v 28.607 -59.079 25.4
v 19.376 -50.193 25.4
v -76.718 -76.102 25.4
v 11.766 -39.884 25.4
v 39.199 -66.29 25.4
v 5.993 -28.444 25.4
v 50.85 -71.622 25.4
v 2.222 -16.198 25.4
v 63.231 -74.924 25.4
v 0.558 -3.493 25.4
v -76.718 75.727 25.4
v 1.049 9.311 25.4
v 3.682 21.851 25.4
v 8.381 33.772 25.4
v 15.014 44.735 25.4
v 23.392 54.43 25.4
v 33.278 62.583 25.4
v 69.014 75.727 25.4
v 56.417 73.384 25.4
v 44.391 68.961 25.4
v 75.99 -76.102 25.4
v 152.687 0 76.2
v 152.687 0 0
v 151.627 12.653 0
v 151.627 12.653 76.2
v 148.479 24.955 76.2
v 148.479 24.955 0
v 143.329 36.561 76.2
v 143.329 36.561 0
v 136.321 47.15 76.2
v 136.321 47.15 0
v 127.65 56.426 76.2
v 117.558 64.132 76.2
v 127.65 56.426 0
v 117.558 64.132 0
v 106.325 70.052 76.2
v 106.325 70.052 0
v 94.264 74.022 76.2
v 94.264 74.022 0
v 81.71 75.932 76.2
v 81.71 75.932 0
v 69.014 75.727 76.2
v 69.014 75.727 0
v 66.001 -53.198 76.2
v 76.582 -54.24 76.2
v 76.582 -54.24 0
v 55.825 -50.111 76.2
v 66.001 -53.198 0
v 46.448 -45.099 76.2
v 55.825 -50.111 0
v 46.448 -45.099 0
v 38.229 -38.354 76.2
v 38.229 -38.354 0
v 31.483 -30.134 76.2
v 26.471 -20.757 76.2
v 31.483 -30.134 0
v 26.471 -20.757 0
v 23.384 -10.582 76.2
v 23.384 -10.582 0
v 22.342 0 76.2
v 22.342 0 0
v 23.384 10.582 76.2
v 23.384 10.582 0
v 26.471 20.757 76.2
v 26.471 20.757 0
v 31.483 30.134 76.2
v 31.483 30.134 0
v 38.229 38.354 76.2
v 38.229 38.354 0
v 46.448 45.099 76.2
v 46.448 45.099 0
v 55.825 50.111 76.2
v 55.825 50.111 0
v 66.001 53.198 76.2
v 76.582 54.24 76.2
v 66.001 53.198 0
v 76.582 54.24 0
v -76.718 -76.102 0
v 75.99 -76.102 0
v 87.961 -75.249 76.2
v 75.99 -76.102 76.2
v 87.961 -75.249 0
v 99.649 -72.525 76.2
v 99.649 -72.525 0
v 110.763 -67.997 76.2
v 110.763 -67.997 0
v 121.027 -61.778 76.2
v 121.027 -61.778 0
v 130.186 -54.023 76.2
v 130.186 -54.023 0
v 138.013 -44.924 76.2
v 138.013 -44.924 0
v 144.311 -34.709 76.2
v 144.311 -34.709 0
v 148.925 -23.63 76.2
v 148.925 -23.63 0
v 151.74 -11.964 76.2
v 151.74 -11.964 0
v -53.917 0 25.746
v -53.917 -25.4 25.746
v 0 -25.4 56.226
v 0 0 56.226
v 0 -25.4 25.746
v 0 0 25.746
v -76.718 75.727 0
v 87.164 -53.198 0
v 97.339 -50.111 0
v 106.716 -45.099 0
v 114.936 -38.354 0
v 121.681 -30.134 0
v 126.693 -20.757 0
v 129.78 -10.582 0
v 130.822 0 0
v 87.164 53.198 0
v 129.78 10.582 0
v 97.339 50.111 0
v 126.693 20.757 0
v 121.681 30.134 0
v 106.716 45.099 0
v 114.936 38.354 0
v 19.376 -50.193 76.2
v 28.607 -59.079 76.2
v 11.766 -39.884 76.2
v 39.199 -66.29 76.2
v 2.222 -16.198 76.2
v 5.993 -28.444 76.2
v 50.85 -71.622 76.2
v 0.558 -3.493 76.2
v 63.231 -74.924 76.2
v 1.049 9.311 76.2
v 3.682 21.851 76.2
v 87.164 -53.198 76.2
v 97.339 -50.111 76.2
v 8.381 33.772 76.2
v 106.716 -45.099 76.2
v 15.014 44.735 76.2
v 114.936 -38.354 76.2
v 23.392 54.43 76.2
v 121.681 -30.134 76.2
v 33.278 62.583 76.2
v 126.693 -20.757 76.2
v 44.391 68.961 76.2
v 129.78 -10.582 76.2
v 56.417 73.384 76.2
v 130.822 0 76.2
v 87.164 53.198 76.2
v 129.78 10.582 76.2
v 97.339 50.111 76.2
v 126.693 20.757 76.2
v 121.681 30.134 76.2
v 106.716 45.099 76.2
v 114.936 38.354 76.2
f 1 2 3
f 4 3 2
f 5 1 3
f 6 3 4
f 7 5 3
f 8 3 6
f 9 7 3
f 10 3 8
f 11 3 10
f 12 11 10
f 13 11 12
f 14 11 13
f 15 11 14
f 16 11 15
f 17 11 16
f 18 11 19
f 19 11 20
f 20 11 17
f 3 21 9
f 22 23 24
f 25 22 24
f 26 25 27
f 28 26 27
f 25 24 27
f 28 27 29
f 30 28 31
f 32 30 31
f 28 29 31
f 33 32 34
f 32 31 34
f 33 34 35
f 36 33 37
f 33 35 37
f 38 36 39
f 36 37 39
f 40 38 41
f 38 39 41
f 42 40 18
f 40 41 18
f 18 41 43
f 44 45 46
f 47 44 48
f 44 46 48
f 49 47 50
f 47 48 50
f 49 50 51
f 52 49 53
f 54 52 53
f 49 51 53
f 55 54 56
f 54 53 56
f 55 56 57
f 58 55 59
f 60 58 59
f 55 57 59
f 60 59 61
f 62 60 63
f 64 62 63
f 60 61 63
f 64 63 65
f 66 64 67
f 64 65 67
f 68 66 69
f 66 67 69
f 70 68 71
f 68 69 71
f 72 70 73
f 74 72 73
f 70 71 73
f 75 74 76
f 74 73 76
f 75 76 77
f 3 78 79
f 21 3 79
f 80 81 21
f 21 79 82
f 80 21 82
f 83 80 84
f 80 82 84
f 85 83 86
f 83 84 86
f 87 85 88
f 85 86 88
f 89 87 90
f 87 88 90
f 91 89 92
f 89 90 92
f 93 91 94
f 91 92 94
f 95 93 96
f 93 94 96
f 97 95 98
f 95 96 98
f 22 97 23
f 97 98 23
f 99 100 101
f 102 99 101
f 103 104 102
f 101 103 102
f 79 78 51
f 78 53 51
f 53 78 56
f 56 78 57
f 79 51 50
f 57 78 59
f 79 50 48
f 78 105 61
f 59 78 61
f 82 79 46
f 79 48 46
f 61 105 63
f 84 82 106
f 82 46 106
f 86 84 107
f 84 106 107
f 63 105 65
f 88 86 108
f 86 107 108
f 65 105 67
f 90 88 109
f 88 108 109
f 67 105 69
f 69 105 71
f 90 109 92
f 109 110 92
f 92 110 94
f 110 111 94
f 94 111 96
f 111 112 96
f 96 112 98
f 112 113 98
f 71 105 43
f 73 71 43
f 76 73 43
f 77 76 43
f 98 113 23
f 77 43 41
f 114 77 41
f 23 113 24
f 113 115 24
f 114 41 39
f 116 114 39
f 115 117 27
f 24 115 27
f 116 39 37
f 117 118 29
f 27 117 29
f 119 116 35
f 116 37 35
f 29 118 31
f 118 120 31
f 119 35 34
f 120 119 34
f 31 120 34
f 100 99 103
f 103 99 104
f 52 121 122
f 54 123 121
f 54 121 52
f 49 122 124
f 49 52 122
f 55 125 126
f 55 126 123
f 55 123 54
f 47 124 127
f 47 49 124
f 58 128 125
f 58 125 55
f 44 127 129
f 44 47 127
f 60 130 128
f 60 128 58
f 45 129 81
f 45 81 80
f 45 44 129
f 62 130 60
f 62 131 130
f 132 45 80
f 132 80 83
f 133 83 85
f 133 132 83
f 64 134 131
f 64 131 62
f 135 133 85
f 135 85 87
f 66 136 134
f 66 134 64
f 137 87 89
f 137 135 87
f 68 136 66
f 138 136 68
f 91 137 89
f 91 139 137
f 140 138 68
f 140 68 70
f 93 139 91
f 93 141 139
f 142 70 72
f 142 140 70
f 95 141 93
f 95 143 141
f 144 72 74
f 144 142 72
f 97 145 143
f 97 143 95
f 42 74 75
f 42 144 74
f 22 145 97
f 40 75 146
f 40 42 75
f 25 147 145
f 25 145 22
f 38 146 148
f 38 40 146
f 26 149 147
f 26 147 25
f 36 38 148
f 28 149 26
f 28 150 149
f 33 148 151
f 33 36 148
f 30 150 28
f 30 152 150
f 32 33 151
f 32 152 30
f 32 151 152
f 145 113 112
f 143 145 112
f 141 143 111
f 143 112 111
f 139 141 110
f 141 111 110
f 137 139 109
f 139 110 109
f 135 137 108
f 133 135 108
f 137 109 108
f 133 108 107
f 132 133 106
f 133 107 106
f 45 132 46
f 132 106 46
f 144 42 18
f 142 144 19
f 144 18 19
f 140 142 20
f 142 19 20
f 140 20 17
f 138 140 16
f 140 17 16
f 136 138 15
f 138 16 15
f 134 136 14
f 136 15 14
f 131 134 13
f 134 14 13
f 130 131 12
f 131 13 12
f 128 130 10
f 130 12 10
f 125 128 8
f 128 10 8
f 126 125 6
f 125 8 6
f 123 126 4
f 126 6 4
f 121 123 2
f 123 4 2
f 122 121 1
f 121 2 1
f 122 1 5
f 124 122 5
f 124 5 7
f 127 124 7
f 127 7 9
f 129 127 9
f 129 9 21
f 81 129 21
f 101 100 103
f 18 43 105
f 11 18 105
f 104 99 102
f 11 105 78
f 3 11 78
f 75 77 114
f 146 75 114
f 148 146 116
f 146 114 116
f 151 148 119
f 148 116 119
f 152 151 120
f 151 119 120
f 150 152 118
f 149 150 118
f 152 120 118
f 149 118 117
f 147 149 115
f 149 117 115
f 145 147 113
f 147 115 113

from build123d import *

# Parameters (mm, degrees)
F1_DEPTH = 76.2
F2_DEPTH = 25.4
F3_W     = 53.91736
F3_H     = 30.479998
F4_DEPTH = 25.4
F6_DEPTH = 76.2


with BuildPart() as f1:
    # F0 (on Top) → F1 (new body)
    with BuildSketch(Plane.XY):
        with BuildLine():
            Line((76.582216, 75.727254), (69.014069, 75.727254))
            ThreePointArc((69.014069, 75.727254), (0.557927, -3.493055), (75.990111, -76.10219))
            Line((75.990111, -76.10219), (76.582216, -76.10219))
            Line((76.582216, -76.10219), (76.582216, -54.240059))
            ThreePointArc((76.582216, -54.240059), (22.342157, 0), (76.582216, 54.240059))
            Line((76.582216, 54.240059), (76.582216, 75.727254))
        make_face()
        with BuildLine():
            ThreePointArc((152.686709, 0), (127.650424, 56.426341), (69.014069, 75.727254))
            Line((69.014069, 75.727254), (76.582216, 75.727254))
            Line((76.582216, 75.727254), (76.582216, 54.240059))
            ThreePointArc((76.582216, 54.240059), (114.935729, 38.353513), (130.822274, 0))
            ThreePointArc((130.822274, 0), (114.935729, -38.353513), (76.582216, -54.240059))
            Line((76.582216, -54.240059), (76.582216, -76.10219))
            Line((76.582216, -76.10219), (75.990111, -76.10219))
            ThreePointArc((75.990111, -76.10219), (130.18647, -54.022938), (152.686709, 0))
        make_face()
    extrude(amount=F1_DEPTH)

    # F0 (on Top) → F2 (join)
    with BuildSketch(Plane.XY):
        with BuildLine():
            Line((69.014069, 75.727254), (-76.717794, 75.727254))
            Line((-76.717794, 75.727254), (-76.717794, -76.10219))
            Line((-76.717794, -76.10219), (75.990111, -76.10219))
            ThreePointArc((75.990111, -76.10219), (0.557927, -3.493055), (69.014069, 75.727254))
        make_face()
        with BuildLine():
            ThreePointArc((152.686709, 0), (127.650424, 56.426341), (69.014069, 75.727254))
            Line((69.014069, 75.727254), (76.582216, 75.727254))
            Line((76.582216, 75.727254), (76.582216, 54.240059))
            ThreePointArc((76.582216, 54.240059), (114.935729, 38.353513), (130.822274, 0))
            ThreePointArc((130.822274, 0), (114.935729, -38.353513), (76.582216, -54.240059))
            Line((76.582216, -54.240059), (76.582216, -76.10219))
            Line((76.582216, -76.10219), (75.990111, -76.10219))
            ThreePointArc((75.990111, -76.10219), (130.18647, -54.022938), (152.686709, 0))
        make_face()
    extrude(amount=F2_DEPTH)


with BuildPart() as f4:
    # F3 (on Front) → F4 (new body)
    with BuildSketch(Plane.XZ):
        with Locations((-26.95868, 40.986363)):
            Rectangle(F3_W, F3_H)
    extrude(amount=F4_DEPTH)

    # F5 (on face) → F6 (cut)
    with BuildSketch(Plane.XZ.offset(25.4)):
        Polygon((-53.91736, 25.746364), (0, 56.226362), (-53.91736, 56.226362), align=None)
    extrude(amount=-F6_DEPTH, mode=Mode.SUBTRACT)


solid = Compound([f1.part, f4.part])
